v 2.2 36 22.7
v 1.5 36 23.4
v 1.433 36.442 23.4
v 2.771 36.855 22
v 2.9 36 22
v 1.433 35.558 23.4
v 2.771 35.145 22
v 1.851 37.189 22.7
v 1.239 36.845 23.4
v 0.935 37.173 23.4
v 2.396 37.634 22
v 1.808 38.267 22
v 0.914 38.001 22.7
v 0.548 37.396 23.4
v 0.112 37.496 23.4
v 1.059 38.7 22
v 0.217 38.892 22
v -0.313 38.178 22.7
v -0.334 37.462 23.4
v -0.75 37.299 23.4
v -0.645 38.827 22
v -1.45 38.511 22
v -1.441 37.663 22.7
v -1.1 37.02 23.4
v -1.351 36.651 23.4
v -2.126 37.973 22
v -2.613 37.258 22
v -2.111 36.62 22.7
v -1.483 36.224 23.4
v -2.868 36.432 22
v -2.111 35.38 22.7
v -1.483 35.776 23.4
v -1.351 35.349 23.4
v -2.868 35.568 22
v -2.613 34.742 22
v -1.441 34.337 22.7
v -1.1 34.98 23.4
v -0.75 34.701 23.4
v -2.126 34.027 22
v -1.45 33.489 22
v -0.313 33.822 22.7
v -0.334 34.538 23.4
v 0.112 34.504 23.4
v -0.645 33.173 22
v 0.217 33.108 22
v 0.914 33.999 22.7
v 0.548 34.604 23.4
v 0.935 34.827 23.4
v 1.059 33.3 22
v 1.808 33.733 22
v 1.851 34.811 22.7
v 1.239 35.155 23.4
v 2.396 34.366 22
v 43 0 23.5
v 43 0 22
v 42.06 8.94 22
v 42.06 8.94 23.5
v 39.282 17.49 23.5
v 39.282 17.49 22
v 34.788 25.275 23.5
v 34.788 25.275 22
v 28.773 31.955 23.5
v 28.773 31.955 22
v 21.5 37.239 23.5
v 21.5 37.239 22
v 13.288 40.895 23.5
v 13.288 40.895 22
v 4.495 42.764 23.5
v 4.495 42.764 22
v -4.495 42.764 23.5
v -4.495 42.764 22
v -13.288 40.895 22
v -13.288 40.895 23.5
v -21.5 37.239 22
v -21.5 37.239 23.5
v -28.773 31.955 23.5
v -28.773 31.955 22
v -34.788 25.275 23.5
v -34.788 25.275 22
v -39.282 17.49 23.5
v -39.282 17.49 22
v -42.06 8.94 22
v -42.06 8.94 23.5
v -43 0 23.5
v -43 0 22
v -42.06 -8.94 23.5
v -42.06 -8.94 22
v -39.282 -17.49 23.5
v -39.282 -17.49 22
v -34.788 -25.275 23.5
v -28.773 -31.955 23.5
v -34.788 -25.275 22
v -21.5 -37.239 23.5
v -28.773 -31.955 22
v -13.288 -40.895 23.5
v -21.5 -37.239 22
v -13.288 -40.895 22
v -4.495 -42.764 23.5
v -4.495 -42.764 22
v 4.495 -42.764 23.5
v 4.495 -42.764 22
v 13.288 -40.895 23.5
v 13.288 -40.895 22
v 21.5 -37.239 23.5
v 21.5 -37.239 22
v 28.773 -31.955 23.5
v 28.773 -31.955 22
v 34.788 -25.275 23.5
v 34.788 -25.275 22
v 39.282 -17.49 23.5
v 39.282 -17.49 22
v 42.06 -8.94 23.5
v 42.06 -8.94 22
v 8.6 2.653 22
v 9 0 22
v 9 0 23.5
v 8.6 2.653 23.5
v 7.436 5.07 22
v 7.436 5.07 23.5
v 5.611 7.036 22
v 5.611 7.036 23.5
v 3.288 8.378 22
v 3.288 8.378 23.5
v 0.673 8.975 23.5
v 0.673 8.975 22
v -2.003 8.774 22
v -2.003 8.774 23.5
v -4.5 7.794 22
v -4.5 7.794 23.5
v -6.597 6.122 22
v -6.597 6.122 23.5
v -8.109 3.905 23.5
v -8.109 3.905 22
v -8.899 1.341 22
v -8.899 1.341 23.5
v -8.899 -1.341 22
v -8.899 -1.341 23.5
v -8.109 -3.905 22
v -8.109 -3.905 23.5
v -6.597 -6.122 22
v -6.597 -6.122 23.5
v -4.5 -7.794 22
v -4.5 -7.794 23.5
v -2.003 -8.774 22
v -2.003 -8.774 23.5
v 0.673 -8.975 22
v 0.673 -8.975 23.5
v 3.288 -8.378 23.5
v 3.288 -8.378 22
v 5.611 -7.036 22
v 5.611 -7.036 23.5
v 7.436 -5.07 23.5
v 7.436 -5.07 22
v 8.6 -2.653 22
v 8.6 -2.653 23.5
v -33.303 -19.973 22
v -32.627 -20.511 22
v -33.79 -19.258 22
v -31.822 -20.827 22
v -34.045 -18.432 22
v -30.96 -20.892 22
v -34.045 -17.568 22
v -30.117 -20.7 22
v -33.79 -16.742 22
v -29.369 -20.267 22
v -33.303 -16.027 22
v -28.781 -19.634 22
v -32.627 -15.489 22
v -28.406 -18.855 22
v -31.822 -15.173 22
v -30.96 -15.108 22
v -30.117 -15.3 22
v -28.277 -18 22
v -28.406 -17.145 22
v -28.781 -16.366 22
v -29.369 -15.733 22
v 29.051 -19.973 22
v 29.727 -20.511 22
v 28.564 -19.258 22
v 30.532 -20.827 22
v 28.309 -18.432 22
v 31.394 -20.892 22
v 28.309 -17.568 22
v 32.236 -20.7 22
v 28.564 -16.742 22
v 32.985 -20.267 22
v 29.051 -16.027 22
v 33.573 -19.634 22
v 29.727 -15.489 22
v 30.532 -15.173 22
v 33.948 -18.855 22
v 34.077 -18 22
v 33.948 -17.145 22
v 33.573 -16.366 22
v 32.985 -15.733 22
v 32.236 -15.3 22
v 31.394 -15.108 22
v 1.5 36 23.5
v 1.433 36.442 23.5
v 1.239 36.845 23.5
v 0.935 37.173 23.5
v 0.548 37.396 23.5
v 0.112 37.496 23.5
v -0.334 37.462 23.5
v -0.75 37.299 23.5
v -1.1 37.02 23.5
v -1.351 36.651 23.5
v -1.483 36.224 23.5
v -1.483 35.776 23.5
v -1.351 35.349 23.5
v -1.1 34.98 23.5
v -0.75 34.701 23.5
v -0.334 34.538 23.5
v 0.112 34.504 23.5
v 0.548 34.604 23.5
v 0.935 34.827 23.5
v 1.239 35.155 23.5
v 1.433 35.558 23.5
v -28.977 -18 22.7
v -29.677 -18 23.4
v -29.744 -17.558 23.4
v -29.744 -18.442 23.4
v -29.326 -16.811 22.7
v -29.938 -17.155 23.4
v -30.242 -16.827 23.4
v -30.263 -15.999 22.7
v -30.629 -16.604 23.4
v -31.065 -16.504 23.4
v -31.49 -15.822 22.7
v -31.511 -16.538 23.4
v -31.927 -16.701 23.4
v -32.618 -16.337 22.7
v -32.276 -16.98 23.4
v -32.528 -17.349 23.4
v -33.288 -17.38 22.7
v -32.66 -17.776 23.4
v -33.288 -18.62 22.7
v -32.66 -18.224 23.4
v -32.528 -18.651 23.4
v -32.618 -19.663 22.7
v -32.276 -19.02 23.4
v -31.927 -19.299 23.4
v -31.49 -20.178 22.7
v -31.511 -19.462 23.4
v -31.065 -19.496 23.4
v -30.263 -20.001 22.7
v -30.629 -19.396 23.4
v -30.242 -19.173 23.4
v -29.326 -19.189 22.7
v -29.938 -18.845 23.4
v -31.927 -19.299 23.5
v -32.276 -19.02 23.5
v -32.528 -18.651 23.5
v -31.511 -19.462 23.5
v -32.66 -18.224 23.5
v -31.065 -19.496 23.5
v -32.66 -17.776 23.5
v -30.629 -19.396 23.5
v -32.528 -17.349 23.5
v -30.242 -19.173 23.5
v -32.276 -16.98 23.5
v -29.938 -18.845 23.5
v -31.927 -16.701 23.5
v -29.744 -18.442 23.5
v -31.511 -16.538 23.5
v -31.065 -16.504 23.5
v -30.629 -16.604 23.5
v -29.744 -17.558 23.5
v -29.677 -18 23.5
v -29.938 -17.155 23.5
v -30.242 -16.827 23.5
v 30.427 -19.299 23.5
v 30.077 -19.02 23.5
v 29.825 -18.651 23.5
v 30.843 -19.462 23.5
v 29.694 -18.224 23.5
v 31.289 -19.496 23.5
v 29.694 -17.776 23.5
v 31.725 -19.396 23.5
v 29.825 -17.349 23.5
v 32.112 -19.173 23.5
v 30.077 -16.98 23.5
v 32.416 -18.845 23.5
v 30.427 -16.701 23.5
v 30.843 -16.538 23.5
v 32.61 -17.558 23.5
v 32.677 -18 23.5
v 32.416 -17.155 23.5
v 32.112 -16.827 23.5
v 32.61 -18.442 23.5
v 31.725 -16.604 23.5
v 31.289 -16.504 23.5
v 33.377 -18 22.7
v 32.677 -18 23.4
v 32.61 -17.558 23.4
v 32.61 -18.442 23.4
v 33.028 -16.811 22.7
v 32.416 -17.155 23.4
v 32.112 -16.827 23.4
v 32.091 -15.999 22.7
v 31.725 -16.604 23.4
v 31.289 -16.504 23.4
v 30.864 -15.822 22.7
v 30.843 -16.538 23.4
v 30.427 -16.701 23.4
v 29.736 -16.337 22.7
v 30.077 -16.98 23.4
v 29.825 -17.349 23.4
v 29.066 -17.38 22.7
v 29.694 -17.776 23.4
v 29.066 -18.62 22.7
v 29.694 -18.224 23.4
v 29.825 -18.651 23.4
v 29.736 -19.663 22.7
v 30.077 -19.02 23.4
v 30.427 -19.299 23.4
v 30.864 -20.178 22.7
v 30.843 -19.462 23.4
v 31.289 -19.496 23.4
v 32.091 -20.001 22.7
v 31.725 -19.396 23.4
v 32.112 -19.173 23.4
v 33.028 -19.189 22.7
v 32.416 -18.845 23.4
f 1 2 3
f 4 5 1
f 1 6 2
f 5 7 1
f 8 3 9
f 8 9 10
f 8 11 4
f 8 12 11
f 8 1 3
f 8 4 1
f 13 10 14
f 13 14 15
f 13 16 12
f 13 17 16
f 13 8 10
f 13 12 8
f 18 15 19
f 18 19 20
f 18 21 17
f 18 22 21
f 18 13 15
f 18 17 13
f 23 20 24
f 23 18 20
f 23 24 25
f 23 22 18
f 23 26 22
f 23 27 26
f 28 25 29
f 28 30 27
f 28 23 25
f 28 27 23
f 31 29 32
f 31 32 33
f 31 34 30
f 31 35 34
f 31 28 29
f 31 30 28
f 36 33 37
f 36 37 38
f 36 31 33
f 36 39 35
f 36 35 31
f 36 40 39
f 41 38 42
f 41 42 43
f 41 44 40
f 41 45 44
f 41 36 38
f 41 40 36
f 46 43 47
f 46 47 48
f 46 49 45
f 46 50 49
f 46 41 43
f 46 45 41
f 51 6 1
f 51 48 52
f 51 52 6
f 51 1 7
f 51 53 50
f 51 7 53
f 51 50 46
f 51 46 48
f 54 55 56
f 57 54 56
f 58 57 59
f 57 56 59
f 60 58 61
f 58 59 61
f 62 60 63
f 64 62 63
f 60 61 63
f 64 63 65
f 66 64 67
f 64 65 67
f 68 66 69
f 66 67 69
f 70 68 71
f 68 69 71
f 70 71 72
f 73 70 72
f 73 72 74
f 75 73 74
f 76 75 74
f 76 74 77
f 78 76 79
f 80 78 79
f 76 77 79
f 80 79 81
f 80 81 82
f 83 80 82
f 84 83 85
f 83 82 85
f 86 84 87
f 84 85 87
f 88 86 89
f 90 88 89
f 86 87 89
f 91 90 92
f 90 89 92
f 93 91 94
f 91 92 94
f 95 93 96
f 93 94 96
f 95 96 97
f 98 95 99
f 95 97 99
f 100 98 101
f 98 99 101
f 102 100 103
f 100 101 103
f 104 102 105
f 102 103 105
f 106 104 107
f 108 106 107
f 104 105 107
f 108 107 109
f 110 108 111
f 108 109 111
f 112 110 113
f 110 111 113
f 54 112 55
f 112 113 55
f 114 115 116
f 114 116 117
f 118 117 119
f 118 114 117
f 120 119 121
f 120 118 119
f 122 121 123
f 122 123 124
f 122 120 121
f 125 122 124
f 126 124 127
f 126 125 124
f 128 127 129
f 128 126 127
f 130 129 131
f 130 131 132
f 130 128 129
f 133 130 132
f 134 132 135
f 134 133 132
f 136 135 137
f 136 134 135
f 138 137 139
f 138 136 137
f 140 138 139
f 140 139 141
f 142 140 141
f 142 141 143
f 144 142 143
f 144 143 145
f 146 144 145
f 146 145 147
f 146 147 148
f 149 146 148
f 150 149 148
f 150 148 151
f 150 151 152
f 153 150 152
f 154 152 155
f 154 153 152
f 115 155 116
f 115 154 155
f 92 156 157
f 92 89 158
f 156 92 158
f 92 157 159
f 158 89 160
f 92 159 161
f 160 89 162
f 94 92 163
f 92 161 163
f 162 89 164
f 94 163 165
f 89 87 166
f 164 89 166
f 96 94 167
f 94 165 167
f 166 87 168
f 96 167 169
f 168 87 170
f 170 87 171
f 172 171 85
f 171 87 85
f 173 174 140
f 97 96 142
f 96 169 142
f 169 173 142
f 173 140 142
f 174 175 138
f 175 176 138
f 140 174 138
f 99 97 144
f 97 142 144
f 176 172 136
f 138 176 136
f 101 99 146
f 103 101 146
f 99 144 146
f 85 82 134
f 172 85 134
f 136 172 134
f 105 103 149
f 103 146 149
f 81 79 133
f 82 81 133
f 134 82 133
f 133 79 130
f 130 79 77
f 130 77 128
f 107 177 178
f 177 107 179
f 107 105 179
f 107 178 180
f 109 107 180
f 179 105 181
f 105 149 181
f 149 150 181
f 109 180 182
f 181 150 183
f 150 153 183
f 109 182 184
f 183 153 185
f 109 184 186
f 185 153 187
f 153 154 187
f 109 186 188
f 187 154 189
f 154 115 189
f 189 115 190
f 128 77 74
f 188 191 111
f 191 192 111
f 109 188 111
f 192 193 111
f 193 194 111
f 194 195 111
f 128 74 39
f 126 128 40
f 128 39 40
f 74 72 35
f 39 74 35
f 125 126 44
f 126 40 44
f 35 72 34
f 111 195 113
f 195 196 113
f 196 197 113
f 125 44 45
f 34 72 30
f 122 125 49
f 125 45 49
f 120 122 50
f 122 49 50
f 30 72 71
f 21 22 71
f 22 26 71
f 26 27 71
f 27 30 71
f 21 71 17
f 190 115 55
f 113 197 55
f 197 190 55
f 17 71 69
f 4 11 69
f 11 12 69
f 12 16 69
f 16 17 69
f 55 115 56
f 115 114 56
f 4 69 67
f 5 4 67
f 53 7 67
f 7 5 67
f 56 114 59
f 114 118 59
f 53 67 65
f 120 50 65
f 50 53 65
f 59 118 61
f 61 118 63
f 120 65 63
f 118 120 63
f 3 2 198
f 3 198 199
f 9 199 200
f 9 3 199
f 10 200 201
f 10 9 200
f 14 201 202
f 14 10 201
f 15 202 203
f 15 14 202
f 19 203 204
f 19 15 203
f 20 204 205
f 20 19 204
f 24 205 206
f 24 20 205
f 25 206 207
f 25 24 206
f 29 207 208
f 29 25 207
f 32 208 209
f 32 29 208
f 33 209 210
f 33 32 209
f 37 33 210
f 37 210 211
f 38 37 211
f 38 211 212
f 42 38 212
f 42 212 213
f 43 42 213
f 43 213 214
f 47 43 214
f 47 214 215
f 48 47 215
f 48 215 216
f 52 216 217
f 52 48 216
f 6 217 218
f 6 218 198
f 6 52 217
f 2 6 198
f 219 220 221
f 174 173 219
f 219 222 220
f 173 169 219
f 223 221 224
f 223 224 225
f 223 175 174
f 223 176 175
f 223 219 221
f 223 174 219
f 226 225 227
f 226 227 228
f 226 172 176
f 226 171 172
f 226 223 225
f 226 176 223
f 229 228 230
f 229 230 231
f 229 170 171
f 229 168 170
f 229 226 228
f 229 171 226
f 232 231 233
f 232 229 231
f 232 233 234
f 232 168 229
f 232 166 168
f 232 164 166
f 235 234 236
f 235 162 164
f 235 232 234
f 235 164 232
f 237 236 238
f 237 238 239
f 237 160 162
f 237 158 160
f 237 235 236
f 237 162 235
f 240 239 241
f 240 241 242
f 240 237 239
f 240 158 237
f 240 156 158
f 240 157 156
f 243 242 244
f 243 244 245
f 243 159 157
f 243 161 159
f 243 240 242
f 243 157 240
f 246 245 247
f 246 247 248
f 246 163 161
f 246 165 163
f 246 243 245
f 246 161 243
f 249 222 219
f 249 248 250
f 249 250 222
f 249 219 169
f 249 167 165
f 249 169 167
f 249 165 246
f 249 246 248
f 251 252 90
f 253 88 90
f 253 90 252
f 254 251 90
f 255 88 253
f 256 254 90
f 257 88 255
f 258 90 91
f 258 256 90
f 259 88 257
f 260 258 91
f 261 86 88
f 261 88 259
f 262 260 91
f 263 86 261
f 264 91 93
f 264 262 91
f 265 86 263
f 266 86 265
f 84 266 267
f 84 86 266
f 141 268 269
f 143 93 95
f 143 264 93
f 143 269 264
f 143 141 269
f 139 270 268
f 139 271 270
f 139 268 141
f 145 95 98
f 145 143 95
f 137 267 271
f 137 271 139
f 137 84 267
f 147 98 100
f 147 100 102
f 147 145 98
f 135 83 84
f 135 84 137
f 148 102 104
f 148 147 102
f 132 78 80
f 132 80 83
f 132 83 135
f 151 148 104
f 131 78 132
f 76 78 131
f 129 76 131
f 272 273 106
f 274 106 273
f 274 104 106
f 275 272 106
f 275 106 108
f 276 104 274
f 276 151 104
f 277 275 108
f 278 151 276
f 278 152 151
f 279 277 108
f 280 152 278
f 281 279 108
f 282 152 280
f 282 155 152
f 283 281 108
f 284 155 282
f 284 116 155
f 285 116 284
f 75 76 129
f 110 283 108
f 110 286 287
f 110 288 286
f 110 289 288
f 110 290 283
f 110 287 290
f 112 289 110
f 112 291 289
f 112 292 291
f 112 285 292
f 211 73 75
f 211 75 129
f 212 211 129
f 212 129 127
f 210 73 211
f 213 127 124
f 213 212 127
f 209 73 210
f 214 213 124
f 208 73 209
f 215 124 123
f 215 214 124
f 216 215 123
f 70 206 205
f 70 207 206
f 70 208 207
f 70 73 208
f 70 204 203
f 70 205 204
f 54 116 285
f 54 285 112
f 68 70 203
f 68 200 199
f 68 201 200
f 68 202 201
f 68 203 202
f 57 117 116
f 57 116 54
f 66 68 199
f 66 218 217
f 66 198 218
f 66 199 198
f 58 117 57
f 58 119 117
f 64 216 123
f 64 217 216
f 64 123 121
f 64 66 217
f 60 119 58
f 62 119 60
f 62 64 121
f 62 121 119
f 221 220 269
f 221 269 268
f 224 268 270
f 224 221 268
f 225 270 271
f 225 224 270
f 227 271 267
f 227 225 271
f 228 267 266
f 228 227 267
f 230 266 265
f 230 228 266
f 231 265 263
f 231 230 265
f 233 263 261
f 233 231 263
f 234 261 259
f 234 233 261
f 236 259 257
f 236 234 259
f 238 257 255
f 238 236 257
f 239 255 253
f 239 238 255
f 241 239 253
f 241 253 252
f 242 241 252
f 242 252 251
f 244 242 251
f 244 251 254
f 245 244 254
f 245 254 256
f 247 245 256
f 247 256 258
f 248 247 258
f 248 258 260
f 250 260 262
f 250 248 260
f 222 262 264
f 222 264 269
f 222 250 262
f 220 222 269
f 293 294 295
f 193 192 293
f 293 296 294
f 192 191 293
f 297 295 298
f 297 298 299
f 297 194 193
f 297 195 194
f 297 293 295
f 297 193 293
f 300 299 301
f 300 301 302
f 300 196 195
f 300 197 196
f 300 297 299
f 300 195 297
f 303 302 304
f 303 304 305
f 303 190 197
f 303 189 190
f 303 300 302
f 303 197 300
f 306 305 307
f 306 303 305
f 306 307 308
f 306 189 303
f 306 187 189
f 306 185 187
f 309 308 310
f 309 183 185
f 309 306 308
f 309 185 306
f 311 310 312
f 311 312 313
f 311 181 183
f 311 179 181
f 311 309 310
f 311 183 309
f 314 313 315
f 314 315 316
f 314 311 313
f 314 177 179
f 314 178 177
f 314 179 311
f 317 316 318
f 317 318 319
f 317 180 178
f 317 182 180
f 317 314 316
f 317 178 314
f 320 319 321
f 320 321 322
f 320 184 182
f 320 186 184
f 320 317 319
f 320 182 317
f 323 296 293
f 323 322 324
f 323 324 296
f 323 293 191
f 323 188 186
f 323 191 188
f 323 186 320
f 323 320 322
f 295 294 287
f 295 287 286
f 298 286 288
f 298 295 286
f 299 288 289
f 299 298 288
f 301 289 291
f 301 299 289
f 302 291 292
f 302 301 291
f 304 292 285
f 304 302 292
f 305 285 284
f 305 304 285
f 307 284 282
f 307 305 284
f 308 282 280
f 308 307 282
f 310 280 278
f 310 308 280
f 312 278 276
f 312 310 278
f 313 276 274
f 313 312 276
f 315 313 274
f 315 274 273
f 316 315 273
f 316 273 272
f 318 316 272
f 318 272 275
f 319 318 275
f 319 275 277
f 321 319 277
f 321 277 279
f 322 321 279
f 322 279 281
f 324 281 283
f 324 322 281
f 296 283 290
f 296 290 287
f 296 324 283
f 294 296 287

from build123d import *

# Parameters (mm, degrees)
SKETCH006_R   = 43
SKETCH006_R_2 = 1.5
SKETCH006_R_3 = 9
PAD_DEPTH     = 1.5
CHAMFER_SIZE  = 1.4


with BuildPart() as part:
    # Sketch006 → Pad (new body)
    with BuildSketch(Plane.XY.offset(22)):
        Circle(SKETCH006_R)
        with Locations((0, 36)):
            Circle(SKETCH006_R_2, mode=Mode.SUBTRACT)
        with Locations((31.176915, -18)):
            Circle(SKETCH006_R_2, mode=Mode.SUBTRACT)
        with Locations((-31.176915, -18)):
            Circle(SKETCH006_R_2, mode=Mode.SUBTRACT)
        Circle(SKETCH006_R_3, mode=Mode.SUBTRACT)
    extrude(amount=PAD_DEPTH)

    # Chamfer
    chamfer_edges = [part.edges().sort_by_distance(p)[0] for p in [
        (-32.676915, -18, 22),
        (-1.5, 36, 22),
        (29.676915, -18, 22),
    ]]
    chamfer(chamfer_edges, length=CHAMFER_SIZE)


solid = part.part
